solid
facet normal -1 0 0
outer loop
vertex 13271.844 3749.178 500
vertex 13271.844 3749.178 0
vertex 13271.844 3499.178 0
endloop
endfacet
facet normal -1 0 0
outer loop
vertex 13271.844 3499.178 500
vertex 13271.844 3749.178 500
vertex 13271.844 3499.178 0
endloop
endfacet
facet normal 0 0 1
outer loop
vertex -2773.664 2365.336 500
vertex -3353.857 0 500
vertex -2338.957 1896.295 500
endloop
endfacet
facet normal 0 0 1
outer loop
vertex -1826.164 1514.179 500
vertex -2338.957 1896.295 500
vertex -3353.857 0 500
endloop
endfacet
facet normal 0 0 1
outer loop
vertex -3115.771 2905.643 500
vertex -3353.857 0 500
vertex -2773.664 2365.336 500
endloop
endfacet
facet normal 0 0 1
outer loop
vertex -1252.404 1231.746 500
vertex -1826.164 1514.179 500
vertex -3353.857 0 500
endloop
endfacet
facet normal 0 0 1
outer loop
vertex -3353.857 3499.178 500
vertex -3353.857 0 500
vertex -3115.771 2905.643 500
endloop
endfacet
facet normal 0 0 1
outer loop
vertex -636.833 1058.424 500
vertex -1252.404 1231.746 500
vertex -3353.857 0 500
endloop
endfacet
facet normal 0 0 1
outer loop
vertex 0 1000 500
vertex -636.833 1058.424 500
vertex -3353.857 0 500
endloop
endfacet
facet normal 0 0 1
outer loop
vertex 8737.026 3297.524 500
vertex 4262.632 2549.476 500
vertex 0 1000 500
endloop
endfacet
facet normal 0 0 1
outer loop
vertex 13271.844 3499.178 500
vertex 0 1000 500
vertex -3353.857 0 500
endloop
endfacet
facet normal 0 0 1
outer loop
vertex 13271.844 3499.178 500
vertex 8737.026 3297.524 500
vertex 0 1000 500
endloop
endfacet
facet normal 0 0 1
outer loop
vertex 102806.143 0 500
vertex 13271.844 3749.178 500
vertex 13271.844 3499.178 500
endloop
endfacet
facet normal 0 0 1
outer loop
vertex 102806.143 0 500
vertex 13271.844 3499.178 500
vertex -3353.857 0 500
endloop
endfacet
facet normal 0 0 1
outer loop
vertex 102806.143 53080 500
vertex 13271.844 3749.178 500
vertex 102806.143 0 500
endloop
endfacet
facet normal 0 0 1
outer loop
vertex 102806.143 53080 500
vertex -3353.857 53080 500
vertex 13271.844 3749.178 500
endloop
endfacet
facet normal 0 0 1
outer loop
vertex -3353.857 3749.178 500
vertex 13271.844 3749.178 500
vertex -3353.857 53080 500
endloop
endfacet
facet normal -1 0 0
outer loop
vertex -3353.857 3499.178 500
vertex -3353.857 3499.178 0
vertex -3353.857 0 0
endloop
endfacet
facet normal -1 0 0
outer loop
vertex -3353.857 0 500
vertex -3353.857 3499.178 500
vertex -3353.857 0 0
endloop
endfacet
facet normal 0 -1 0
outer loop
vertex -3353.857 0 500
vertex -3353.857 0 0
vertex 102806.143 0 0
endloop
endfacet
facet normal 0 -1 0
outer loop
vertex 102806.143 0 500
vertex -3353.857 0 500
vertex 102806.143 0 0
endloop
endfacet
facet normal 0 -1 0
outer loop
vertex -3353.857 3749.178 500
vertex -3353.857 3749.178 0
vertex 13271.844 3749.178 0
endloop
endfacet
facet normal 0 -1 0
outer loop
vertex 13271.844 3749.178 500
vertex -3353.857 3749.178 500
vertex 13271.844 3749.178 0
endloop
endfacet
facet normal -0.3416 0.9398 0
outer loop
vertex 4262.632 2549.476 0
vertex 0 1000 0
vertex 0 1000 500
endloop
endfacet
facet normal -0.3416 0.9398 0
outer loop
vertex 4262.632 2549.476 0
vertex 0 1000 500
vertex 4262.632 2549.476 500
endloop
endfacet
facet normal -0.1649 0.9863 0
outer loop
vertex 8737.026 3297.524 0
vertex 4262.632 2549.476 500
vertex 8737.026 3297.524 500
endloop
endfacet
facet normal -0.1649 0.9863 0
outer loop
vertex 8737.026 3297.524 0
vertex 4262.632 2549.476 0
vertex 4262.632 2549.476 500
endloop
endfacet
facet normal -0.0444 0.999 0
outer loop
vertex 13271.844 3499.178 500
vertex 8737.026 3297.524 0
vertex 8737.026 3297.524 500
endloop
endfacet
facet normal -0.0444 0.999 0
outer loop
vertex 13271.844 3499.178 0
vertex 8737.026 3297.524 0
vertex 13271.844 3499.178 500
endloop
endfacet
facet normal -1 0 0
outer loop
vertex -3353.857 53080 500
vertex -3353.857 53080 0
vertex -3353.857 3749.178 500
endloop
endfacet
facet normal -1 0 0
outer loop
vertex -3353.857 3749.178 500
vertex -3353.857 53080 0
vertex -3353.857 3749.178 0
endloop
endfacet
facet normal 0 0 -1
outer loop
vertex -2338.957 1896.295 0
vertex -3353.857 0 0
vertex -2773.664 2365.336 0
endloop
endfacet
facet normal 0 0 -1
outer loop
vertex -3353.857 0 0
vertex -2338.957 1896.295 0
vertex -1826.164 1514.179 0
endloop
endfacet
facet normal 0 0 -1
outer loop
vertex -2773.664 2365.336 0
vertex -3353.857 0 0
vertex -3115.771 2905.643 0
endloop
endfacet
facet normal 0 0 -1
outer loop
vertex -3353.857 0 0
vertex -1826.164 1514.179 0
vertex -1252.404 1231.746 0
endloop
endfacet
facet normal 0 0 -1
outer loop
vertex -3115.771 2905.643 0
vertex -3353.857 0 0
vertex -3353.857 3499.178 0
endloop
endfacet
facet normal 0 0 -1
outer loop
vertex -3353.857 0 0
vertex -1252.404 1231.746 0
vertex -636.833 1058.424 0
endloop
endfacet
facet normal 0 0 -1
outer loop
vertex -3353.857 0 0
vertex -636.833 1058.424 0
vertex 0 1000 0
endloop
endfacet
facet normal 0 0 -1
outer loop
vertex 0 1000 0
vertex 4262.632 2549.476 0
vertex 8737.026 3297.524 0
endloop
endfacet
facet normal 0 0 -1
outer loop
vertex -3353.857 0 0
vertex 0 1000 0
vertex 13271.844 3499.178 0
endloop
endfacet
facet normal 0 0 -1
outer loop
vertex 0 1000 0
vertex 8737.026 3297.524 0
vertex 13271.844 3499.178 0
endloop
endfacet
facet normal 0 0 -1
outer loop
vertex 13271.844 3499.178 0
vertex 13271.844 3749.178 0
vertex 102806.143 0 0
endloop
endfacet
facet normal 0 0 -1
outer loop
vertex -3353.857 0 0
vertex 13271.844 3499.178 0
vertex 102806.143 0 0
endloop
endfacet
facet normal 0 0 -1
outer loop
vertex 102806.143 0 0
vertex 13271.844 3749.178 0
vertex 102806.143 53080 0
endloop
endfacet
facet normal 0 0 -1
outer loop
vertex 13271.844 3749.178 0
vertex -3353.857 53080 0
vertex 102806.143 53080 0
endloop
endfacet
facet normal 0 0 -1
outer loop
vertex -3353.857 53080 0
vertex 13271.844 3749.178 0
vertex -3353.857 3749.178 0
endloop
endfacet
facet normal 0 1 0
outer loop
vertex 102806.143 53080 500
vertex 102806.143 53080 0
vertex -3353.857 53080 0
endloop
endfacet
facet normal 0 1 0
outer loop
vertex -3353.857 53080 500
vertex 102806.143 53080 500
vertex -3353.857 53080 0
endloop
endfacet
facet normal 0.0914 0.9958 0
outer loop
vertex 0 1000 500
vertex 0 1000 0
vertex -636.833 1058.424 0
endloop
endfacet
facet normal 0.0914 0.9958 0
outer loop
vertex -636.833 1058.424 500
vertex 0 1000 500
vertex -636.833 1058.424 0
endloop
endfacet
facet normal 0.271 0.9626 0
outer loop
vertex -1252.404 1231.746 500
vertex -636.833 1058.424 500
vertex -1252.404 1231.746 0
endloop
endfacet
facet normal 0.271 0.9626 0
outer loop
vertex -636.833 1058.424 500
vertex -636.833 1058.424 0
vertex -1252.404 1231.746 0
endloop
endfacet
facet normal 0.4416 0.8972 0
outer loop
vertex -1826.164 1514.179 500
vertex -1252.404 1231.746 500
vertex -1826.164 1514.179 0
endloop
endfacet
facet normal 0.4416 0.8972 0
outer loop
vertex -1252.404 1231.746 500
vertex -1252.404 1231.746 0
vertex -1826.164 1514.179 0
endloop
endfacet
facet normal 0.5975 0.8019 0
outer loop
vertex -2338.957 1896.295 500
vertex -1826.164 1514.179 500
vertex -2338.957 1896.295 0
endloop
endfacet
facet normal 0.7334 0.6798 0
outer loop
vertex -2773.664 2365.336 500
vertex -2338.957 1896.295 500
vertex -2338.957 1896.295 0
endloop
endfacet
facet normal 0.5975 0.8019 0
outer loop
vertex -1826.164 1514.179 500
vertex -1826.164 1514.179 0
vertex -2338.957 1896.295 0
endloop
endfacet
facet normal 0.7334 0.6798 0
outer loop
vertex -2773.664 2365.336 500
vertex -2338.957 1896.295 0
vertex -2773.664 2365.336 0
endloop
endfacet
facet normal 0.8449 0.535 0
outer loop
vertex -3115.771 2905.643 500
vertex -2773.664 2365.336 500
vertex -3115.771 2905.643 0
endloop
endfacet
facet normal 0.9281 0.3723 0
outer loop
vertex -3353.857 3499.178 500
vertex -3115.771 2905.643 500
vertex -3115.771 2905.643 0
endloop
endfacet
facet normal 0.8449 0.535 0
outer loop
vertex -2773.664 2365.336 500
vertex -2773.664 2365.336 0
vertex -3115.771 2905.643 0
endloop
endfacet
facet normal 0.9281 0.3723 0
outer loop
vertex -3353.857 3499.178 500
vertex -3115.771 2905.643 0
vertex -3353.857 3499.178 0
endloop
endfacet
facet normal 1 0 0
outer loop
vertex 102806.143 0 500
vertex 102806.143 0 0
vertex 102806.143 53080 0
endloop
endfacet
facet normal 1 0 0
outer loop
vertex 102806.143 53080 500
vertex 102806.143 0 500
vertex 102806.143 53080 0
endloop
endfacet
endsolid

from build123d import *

# Parameters (mm, degrees)
BOSS_EXTRUDE1_DEPTH = 500


with BuildPart() as part:
    # Sketch1 → Boss-Extrude1 (new body)
    with BuildSketch(Plane.XY):
        with BuildLine():
            Line((-3353.856874341, 3499.178304373), (-3353.856874341, 0))
            Line((-3353.856874341, 0), (102806.143125659, 0))
            Line((102806.143125659, 0), (102806.143125659, 53080))
            Line((102806.143125659, 53080), (-3353.856874341, 53080))
            Line((-3353.856874341, 53080), (-3353.856874341, 3749.178304373))
            Line((-3353.856874341, 3749.178304373), (13271.843629608, 3749.178304373))
            Line((13271.843629608, 3749.178304373), (13271.843629608, 3499.178304373))
            add(Edge.make_bspline(
                [(0, 1000), (291.765900603, 1123.322488736), (781.522297226, 1330.330838858), (1362.897354233, 1573.653151088), (1725.58055856, 1720.77055381), (1954.57140661, 1810.926420972), (2153.700733637, 1887.07815454), (2340.113195958, 1956.278566329), (2520.568742906, 2021.269176864), (2698.631529223, 2083.441582039), (2876.496758345, 2143.60559098), (3055.666034414, 2202.270703111), (3237.250612129, 2259.773582693), (3422.126312829, 2316.342813928), (3611.0201096, 2372.13499832), (3804.562016384, 2427.256160941), (4003.317955266, 2481.775096262), (4207.811570405, 2535.731997309), (4418.539306117, 2589.144190276), (4635.981220127, 2642.010014835), (4860.60901013, 2694.311472469), (5092.892172544, 2746.016028353), (5333.302883792, 2797.077813252), (5582.319994726, 2847.438387022), (5840.432403528, 2897.027171884), (6108.141991809, 2945.761629128), (6385.966255513, 2993.547229939), (6674.440726513, 3040.277255451), (6974.121256361, 3085.832450297), (7285.586216703, 3130.080546165), (7609.438658958, 3172.875666363), (7946.308467423, 3214.05761783), (8296.854533956, 3253.451075226), (8661.766978119, 3290.864653641), (9041.76943365, 3326.089886388), (9437.621420016, 3358.900035556), (9850.120816466, 3389.049006357), (10280.106455001, 3416.269267446), (10728.460848663, 3440.273104087), (11196.113069896, 3460.739986102), (11684.04179999, 3477.358423093), (12193.278546938, 3489.650420084), (12724.911125486, 3497.660104241), (13086.92500481, 3498.66499884), (13271.843629608, 3499.178304373)],
                knots=[0, 0, 0, 0, 0.069755542, 0.117091212, 0.138787236, 0.155943701, 0.171285447, 0.185735274, 0.199731374, 0.213522724, 0.227268493, 0.241079694, 0.25503928, 0.269212874, 0.283654957, 0.298412647, 0.313528137, 0.329040333, 0.344985992, 0.361400555, 0.378318753, 0.395775091, 0.413804224, 0.432441268, 0.451722064, 0.47168341, 0.492363267, 0.513800952, 0.53603732, 0.559114937, 0.583078259, 0.6079738, 0.633850311, 0.660758958, 0.688753512, 0.717890543, 0.748229621, 0.779833533, 0.812768508, 0.847104461, 0.882915243, 0.920278917, 0.959278044, 1, 1, 1, 1], degree=3))
            ThreePointArc((0, 1000), (-2091.306298143, 1693.500762988), (-3353.856874341, 3499.178304373))
        make_face()
    extrude(amount=BOSS_EXTRUDE1_DEPTH)


solid = part.part
